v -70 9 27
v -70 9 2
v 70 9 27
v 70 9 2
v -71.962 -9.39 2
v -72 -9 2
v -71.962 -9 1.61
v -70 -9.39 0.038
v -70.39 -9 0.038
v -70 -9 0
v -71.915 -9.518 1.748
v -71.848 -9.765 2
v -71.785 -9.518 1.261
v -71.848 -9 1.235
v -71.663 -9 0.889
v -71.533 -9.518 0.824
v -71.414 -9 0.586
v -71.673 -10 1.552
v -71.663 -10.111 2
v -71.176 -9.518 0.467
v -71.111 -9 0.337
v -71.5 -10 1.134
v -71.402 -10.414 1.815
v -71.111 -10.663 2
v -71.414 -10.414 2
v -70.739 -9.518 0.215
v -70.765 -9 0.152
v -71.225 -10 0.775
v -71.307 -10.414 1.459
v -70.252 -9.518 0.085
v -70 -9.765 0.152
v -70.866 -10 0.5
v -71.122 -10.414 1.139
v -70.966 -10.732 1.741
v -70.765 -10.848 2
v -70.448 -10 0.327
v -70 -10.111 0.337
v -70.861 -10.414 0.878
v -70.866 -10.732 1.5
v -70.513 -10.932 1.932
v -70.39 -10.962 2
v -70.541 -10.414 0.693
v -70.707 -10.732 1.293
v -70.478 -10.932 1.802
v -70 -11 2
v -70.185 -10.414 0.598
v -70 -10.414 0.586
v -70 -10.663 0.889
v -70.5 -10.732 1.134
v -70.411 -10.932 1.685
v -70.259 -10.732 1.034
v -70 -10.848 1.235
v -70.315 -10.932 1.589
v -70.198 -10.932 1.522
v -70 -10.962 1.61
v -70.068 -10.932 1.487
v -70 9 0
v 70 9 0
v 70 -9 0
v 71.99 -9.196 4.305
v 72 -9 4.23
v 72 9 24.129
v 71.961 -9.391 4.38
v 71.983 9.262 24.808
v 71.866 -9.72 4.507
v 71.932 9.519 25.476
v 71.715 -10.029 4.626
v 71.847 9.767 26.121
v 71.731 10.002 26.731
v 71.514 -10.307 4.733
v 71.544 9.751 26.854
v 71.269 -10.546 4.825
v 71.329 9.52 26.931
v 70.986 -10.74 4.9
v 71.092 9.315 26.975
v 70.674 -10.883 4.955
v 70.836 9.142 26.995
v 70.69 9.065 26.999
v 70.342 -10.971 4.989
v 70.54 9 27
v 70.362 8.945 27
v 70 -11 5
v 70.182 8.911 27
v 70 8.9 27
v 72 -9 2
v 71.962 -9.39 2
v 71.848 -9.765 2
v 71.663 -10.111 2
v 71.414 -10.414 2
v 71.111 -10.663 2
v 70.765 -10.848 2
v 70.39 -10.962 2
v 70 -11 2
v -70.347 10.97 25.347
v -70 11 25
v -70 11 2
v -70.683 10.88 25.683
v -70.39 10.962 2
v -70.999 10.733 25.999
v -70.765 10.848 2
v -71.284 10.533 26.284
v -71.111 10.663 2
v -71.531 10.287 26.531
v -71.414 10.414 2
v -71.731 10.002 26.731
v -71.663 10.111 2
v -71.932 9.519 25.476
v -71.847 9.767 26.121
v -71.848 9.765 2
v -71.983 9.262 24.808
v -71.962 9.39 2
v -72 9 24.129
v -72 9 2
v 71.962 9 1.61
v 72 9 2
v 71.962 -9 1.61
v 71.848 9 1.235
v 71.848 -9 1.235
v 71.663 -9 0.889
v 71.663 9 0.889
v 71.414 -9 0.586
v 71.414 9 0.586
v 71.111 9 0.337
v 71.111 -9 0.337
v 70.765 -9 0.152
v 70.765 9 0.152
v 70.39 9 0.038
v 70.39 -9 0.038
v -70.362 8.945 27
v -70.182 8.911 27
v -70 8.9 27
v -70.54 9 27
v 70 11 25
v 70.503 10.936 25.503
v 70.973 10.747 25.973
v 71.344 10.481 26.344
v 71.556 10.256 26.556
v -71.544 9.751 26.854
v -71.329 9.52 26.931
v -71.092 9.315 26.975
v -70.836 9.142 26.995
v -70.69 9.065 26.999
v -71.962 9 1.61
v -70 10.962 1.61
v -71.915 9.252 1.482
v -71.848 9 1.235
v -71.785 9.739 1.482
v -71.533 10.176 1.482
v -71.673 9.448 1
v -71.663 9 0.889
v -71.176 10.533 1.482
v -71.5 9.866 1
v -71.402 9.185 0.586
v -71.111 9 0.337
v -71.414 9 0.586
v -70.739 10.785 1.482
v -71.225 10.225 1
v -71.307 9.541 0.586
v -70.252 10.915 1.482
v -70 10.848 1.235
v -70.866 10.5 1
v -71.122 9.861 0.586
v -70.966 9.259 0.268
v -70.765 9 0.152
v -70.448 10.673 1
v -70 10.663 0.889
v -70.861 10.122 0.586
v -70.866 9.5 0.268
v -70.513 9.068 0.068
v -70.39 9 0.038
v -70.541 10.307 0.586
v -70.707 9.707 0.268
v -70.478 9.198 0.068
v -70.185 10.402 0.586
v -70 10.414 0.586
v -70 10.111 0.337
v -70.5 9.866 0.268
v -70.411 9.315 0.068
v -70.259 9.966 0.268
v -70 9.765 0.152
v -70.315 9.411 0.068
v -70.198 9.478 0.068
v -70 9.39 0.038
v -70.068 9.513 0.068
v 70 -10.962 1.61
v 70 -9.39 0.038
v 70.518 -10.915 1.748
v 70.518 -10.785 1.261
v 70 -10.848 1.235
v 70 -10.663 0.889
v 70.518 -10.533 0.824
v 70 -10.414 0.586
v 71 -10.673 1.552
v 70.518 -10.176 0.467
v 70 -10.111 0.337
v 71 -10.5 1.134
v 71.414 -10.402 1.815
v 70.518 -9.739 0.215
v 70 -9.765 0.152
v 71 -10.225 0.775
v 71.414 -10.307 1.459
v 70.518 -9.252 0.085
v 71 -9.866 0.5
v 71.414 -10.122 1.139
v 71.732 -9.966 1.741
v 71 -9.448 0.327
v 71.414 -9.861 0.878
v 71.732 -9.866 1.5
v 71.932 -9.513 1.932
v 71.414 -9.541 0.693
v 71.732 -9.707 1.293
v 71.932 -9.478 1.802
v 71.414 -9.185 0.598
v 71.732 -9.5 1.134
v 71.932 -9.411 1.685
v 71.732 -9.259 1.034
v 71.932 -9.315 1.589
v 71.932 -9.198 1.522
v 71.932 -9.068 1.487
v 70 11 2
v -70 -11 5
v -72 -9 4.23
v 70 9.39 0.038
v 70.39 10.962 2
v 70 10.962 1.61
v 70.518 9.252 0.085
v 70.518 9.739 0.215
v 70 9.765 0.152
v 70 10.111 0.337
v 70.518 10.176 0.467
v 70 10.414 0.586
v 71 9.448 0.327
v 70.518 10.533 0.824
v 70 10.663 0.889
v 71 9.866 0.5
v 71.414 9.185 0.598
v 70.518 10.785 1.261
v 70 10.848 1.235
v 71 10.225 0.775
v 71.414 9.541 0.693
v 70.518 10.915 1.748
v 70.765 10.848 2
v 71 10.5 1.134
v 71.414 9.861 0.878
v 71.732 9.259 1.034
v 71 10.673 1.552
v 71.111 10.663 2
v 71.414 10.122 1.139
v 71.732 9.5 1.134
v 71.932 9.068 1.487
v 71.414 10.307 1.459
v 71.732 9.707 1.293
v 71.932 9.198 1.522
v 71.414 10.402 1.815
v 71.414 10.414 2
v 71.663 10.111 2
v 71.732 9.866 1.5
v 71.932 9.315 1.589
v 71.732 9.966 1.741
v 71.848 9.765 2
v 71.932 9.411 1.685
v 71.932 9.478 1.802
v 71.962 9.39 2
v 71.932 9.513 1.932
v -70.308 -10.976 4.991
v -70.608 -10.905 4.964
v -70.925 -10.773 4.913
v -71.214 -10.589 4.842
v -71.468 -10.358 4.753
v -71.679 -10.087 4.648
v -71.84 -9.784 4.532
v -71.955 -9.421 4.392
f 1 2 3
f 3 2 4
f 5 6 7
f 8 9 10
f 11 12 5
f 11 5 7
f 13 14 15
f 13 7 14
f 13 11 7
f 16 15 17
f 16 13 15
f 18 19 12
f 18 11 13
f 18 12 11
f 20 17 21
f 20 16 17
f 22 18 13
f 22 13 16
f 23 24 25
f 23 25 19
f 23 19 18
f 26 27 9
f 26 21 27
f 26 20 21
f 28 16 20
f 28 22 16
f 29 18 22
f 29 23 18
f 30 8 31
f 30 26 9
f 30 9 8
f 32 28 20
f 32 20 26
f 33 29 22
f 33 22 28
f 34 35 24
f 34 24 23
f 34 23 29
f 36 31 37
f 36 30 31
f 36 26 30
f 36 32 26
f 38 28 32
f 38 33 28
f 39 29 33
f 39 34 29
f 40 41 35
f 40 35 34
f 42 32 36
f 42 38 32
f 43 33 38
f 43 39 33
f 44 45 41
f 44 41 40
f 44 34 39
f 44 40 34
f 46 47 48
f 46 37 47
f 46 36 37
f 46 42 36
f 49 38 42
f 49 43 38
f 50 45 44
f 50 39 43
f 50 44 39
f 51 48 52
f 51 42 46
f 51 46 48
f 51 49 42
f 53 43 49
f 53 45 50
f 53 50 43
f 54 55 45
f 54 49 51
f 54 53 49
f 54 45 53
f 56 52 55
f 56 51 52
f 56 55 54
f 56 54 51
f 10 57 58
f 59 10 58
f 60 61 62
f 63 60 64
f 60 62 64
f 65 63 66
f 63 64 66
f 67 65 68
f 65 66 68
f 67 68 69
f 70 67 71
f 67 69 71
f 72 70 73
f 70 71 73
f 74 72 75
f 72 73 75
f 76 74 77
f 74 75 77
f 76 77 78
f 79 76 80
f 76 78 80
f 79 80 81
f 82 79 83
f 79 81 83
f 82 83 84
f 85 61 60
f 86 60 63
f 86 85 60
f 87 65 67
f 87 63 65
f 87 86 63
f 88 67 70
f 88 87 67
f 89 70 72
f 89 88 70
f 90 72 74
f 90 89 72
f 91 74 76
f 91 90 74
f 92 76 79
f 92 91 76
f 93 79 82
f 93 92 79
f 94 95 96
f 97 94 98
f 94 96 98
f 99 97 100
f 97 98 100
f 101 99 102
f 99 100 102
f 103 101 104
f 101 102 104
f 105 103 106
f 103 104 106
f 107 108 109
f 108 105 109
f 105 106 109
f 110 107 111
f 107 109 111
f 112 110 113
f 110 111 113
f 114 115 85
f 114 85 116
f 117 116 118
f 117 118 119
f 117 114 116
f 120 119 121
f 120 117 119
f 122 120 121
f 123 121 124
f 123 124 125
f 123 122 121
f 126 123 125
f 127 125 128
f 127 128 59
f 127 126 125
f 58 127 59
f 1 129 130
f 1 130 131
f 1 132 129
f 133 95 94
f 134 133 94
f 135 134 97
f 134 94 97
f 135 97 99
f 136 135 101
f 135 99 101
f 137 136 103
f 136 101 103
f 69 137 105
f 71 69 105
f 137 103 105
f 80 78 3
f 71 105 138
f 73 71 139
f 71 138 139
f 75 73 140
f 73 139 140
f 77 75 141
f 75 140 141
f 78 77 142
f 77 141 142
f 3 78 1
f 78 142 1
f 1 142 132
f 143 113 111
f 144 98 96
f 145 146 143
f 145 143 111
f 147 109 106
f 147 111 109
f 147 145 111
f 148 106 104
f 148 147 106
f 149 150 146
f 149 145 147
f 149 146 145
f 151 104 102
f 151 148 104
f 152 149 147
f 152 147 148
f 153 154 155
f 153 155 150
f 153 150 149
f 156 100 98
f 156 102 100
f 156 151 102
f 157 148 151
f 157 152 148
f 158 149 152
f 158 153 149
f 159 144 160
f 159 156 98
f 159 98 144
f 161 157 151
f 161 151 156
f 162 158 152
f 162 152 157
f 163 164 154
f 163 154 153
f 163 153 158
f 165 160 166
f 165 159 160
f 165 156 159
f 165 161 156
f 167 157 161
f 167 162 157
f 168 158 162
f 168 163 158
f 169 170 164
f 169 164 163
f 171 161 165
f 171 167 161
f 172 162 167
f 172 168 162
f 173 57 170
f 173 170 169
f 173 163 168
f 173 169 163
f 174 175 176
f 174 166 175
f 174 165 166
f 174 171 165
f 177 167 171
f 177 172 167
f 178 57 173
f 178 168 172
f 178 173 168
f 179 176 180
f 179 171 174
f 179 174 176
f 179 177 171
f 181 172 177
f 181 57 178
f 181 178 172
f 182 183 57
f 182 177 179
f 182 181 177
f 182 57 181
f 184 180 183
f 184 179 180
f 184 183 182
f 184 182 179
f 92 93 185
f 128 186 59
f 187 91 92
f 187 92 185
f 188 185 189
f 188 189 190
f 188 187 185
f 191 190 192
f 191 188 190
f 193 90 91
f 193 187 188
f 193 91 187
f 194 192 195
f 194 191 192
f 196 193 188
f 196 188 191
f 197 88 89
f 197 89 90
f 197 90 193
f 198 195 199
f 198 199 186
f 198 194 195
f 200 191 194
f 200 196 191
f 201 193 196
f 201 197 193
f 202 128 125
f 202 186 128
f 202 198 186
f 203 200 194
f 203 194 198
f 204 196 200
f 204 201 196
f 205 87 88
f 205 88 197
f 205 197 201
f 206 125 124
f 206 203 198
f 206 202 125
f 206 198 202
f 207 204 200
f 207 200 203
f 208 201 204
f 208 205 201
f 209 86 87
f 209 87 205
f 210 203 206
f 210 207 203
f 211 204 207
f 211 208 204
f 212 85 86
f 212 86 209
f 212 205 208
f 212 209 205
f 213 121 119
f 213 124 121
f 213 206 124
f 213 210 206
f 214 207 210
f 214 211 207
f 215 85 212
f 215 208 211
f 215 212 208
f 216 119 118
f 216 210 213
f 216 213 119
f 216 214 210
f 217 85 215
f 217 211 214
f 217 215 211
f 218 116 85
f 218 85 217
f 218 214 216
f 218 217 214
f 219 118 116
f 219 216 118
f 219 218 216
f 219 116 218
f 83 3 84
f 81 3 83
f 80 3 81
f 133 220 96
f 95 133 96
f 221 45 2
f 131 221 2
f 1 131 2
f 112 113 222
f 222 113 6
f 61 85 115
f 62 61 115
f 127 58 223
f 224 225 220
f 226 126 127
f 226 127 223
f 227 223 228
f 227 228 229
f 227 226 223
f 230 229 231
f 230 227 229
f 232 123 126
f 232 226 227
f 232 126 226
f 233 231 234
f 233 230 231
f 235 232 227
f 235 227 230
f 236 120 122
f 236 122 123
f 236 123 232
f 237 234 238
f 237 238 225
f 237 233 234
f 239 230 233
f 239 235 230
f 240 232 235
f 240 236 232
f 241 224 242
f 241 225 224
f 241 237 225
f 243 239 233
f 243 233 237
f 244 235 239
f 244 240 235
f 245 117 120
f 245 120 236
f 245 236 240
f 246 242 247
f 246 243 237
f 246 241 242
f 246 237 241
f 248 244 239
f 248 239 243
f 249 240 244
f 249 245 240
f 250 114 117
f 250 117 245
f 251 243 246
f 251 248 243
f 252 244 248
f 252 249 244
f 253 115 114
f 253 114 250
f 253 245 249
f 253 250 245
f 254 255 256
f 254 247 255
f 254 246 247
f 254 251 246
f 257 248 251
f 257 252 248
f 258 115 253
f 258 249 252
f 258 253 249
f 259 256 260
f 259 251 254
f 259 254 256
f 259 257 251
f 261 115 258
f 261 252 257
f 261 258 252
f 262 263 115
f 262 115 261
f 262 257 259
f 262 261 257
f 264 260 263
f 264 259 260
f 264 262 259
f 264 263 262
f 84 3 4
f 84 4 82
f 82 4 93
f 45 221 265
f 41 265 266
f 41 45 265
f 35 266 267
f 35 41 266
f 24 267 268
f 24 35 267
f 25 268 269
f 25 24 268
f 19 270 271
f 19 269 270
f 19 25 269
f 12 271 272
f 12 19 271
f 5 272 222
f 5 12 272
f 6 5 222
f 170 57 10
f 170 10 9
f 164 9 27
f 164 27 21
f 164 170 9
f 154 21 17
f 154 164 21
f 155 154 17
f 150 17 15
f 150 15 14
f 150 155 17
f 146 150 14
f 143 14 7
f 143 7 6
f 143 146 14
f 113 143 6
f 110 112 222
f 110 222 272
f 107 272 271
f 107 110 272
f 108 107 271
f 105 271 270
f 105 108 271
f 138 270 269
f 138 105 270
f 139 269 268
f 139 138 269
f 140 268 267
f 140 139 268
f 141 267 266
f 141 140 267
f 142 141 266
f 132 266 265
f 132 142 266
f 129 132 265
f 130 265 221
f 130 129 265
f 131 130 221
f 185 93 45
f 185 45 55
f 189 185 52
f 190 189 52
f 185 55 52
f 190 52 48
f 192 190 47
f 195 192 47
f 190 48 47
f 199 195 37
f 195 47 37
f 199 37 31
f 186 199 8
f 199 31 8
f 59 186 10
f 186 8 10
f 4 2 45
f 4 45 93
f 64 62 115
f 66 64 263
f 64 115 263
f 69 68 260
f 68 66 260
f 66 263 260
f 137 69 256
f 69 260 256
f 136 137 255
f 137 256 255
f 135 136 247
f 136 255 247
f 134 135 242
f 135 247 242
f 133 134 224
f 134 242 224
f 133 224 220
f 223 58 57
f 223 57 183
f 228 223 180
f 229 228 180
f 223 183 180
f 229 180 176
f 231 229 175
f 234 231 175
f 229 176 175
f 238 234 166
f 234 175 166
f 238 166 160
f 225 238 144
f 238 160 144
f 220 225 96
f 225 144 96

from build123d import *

# Parameters (mm, degrees)
F0_W         = 144
F0_H         = 22
F1_DEPTH     = 2
F3_DEPTH     = 25
F5_DEPTH     = 160
F6_T1_DEPTH  = 18
F6_T3_DEPTH  = 140
F6_T5_DEPTH  = 30
F6_T7_DEPTH  = 39.6649624979
F6_T9_DEPTH  = 8
F6_T11_DEPTH = 154
F6_S15_W     = 2
F6_S15_H     = 2
F6_T16_DEPTH = 2
F6_S21_W     = 2
F6_S21_H     = 2
F6_T22_DEPTH = 2
F6_S27_W     = 2
F6_S27_H     = 2
F6_T28_DEPTH = 2
F6_S33_W     = 2
F6_S33_H     = 2
F6_T34_DEPTH = 2


# Not quite as in the source:
# - a fillet or chamfer that OpenCascade refuses, or shapes differently, is made with other operations: its cross-section is extruded or revolved along the edge and cut away or added


with BuildPart() as f1:
    # F0 (on Top) → F1 (new body)
    with BuildSketch(Plane.XY):
        Rectangle(F0_W, F0_H)
    extrude(amount=F1_DEPTH)

    # F2 (on face) → F3 (join)
    with BuildSketch(Plane.XY.offset(2)):
        Polygon((-70.000000298, -11), (-70.000000298, 9.000000298), (70.000000298, 9.000000298), (70.000000298, -11), (72, -11), (72, 11), (-72, 11), (-72, -11), align=None)
    extrude(amount=F3_DEPTH)

    # F4 (on face) → F5 (cut)
    with BuildSketch(Plane(origin=(-72, 0, 0), x_dir=(0, -1, 0), z_dir=(-1, 0, 0))):
        Polygon((11, 27), (-8.9, 27), (11, 5), align=None)
    extrude(amount=-F5_DEPTH, mode=Mode.SUBTRACT)

    # F6: fillet of radius 2 on 11 edges, made by hand

    # F6_s2 → F6_t1 (cut)
    with BuildSketch(Plane.XZ.offset(-9)):
        with BuildLine():
            ThreePointArc((72, 2), (71.4142135624, 0.5857864376), (70, 0))
            Line((70, 0), (72, 0))
            Line((72, 0), (72, 2))
        make_face()
        with BuildLine():
            ThreePointArc((-70, 0), (-71.4142135624, 0.5857864376), (-72, 2))
            Line((-72, 2), (-72, 0))
            Line((-72, 0), (-70, 0))
        make_face()
    extrude(amount=F6_T1_DEPTH, mode=Mode.SUBTRACT)

    # F6_s4 → F6_t3 (cut)
    with BuildSketch(Plane.YZ.offset(-70)):
        with BuildLine():
            ThreePointArc((9, 0), (10.4142135624, 0.5857864376), (11, 2))
            Line((11, 2), (11, 0))
            Line((11, 0), (9, 0))
        make_face()
        with BuildLine():
            ThreePointArc((-11, 2), (-10.4142135624, 0.5857864376), (-9, 0))
            Line((-9, 0), (-11, 0))
            Line((-11, 0), (-11, 2))
        make_face()
    extrude(amount=F6_T3_DEPTH, mode=Mode.SUBTRACT)

    # F6_s6 → F6_t5 (cut)
    with BuildSketch(Plane.XY.offset(2)):
        with BuildLine():
            ThreePointArc((-70, 11), (-71.4142135624, 10.4142135624), (-72, 9))
            Line((-72, 9), (-72, 11))
            Line((-72, 11), (-70, 11))
        make_face()
        with BuildLine():
            ThreePointArc((72, 9), (71.4142135624, 10.4142135624), (70, 11))
            Line((70, 11), (72, 11))
            Line((72, 11), (72, 9))
        make_face()
    extrude(amount=F6_T5_DEPTH, mode=Mode.SUBTRACT)

    # F6_s8 → F6_t7 (cut)
    with BuildSketch(Plane(origin=(0, 20.7915282423, 22.9856091121), x_dir=(1, 0, 0), z_dir=(0, -0.6708250517, -0.741615635))):
        with BuildLine():
            ThreePointArc((72, 9.5118972432), (71.4142135624, 10.9261108056), (70, 11.5118972432))
            Line((70, 11.5118972432), (72, 11.5118972432))
            Line((72, 11.5118972432), (72, 9.5118972432))
        make_face()
        with BuildLine():
            ThreePointArc((-72, 9.5118972432), (-71.4142135624, 10.9261108056), (-70, 11.5118972432))
            Line((-70, 11.5118972432), (-72, 11.5118972432))
            Line((-72, 11.5118972432), (-72, 9.5118972432))
        make_face()
    extrude(amount=F6_T7_DEPTH, mode=Mode.SUBTRACT)

    # F6_s10 → F6_t9 (cut)
    with BuildSketch(Plane.XY.offset(2)):
        with BuildLine():
            ThreePointArc((-70, -11), (-71.4142135624, -10.4142135624), (-72, -9))
            Line((-72, -9), (-72, -11))
            Line((-72, -11), (-70, -11))
        make_face()
        with BuildLine():
            ThreePointArc((72, -9), (71.4142135624, -10.4142135624), (70, -11))
            Line((70, -11), (72, -11))
            Line((72, -11), (72, -9))
        make_face()
    extrude(amount=F6_T9_DEPTH, mode=Mode.SUBTRACT)

    # F6_s12 → F6_t11 (cut)
    with BuildSketch(Plane.YZ.offset(-77)):
        with BuildLine():
            ThreePointArc((11, 25), (10.4142135624, 26.4142135624), (9, 27))
            Line((9, 27), (11, 27))
            Line((11, 27), (11, 25))
        make_face()
    extrude(amount=F6_T11_DEPTH, mode=Mode.SUBTRACT)


with BuildPart() as f6_tool14:
    # F6_s15 → F6_t16 (new body)
    with BuildSketch(Plane.YZ.offset(70)):
        with Locations((-10, 1)):
            Rectangle(F6_S15_W, F6_S15_H)
    extrude(amount=F6_T16_DEPTH)

    # F6_s17 → F6_t18 (revolve, cut)
    with BuildSketch(Plane(origin=(70, -9, 2), x_dir=(0, 0.7071067812, 0.7071067812), z_dir=(0, 0.7071067812, -0.7071067812))):
        with BuildLine():
            ThreePointArc((0, -2), (2, 0), (0, 2))
            Line((0, 2), (0, -2))
        make_face()
    revolve(axis=Axis((70, -9, 2), (1, 0, 0)), mode=Mode.SUBTRACT)


with BuildPart() as f1_1:
    add(f1.part)

    # F6_t13: cut F6_tool14
    add(f6_tool14.part, mode=Mode.SUBTRACT)


with BuildPart() as f6_tool20:
    # F6_s21 → F6_t22 (new body)
    with BuildSketch(Plane.YZ.offset(70)):
        with Locations((10, 1)):
            Rectangle(F6_S21_W, F6_S21_H)
    extrude(amount=F6_T22_DEPTH)

    # F6_s23 → F6_t24 (revolve, cut)
    with BuildSketch(Plane(origin=(70, 9, 2), x_dir=(0, -0.7071067812, 0.7071067812), z_dir=(0, 0.7071067812, 0.7071067812))):
        with BuildLine():
            ThreePointArc((0, -2), (2, 0), (0, 2))
            Line((0, 2), (0, -2))
        make_face()
    revolve(axis=Axis((70, 9, 2), (1, 0, 0)), mode=Mode.SUBTRACT)


with BuildPart() as f1_2:
    add(f1_1.part)

    # F6_t19: cut F6_tool20
    add(f6_tool20.part, mode=Mode.SUBTRACT)


with BuildPart() as f6_tool26:
    # F6_s27 → F6_t28 (new body)
    with BuildSketch(Plane.XY.offset(2)):
        with Locations((-71, 10)):
            Rectangle(F6_S27_W, F6_S27_H)
    extrude(amount=-F6_T28_DEPTH)

    # F6_s29 → F6_t30 (revolve, cut)
    with BuildSketch(Plane(origin=(-70, 9, 2), x_dir=(0.7071067812, -0.7071067812, 0), z_dir=(0.7071067812, 0.7071067812, 0))):
        with BuildLine():
            ThreePointArc((0, -2), (2, 0), (0, 2))
            Line((0, 2), (0, -2))
        make_face()
    revolve(axis=Axis((-70, 9, 2), (0, 0, -1)), mode=Mode.SUBTRACT)


with BuildPart() as f1_3:
    add(f1_2.part)

    # F6_t25: cut F6_tool26
    add(f6_tool26.part, mode=Mode.SUBTRACT)


with BuildPart() as f6_tool32:
    # F6_s33 → F6_t34 (new body)
    with BuildSketch(Plane.XZ.offset(9)):
        with Locations((-71, 1)):
            Rectangle(F6_S33_W, F6_S33_H)
    extrude(amount=F6_T34_DEPTH)

    # F6_s35 → F6_t36 (revolve, cut)
    with BuildSketch(Plane(origin=(-70, -9, 2), x_dir=(0.7071067812, 0, 0.7071067812), z_dir=(0.7071067812, 0, -0.7071067812))):
        with BuildLine():
            ThreePointArc((0, -2), (2, 0), (0, 2))
            Line((0, 2), (0, -2))
        make_face()
    revolve(axis=Axis((-70, -9, 2), (0, -1, 0)), mode=Mode.SUBTRACT)


with BuildPart() as f1_4:
    add(f1_3.part)

    # F6_t31: cut F6_tool32
    add(f6_tool32.part, mode=Mode.SUBTRACT)


solid = f1_4.part
